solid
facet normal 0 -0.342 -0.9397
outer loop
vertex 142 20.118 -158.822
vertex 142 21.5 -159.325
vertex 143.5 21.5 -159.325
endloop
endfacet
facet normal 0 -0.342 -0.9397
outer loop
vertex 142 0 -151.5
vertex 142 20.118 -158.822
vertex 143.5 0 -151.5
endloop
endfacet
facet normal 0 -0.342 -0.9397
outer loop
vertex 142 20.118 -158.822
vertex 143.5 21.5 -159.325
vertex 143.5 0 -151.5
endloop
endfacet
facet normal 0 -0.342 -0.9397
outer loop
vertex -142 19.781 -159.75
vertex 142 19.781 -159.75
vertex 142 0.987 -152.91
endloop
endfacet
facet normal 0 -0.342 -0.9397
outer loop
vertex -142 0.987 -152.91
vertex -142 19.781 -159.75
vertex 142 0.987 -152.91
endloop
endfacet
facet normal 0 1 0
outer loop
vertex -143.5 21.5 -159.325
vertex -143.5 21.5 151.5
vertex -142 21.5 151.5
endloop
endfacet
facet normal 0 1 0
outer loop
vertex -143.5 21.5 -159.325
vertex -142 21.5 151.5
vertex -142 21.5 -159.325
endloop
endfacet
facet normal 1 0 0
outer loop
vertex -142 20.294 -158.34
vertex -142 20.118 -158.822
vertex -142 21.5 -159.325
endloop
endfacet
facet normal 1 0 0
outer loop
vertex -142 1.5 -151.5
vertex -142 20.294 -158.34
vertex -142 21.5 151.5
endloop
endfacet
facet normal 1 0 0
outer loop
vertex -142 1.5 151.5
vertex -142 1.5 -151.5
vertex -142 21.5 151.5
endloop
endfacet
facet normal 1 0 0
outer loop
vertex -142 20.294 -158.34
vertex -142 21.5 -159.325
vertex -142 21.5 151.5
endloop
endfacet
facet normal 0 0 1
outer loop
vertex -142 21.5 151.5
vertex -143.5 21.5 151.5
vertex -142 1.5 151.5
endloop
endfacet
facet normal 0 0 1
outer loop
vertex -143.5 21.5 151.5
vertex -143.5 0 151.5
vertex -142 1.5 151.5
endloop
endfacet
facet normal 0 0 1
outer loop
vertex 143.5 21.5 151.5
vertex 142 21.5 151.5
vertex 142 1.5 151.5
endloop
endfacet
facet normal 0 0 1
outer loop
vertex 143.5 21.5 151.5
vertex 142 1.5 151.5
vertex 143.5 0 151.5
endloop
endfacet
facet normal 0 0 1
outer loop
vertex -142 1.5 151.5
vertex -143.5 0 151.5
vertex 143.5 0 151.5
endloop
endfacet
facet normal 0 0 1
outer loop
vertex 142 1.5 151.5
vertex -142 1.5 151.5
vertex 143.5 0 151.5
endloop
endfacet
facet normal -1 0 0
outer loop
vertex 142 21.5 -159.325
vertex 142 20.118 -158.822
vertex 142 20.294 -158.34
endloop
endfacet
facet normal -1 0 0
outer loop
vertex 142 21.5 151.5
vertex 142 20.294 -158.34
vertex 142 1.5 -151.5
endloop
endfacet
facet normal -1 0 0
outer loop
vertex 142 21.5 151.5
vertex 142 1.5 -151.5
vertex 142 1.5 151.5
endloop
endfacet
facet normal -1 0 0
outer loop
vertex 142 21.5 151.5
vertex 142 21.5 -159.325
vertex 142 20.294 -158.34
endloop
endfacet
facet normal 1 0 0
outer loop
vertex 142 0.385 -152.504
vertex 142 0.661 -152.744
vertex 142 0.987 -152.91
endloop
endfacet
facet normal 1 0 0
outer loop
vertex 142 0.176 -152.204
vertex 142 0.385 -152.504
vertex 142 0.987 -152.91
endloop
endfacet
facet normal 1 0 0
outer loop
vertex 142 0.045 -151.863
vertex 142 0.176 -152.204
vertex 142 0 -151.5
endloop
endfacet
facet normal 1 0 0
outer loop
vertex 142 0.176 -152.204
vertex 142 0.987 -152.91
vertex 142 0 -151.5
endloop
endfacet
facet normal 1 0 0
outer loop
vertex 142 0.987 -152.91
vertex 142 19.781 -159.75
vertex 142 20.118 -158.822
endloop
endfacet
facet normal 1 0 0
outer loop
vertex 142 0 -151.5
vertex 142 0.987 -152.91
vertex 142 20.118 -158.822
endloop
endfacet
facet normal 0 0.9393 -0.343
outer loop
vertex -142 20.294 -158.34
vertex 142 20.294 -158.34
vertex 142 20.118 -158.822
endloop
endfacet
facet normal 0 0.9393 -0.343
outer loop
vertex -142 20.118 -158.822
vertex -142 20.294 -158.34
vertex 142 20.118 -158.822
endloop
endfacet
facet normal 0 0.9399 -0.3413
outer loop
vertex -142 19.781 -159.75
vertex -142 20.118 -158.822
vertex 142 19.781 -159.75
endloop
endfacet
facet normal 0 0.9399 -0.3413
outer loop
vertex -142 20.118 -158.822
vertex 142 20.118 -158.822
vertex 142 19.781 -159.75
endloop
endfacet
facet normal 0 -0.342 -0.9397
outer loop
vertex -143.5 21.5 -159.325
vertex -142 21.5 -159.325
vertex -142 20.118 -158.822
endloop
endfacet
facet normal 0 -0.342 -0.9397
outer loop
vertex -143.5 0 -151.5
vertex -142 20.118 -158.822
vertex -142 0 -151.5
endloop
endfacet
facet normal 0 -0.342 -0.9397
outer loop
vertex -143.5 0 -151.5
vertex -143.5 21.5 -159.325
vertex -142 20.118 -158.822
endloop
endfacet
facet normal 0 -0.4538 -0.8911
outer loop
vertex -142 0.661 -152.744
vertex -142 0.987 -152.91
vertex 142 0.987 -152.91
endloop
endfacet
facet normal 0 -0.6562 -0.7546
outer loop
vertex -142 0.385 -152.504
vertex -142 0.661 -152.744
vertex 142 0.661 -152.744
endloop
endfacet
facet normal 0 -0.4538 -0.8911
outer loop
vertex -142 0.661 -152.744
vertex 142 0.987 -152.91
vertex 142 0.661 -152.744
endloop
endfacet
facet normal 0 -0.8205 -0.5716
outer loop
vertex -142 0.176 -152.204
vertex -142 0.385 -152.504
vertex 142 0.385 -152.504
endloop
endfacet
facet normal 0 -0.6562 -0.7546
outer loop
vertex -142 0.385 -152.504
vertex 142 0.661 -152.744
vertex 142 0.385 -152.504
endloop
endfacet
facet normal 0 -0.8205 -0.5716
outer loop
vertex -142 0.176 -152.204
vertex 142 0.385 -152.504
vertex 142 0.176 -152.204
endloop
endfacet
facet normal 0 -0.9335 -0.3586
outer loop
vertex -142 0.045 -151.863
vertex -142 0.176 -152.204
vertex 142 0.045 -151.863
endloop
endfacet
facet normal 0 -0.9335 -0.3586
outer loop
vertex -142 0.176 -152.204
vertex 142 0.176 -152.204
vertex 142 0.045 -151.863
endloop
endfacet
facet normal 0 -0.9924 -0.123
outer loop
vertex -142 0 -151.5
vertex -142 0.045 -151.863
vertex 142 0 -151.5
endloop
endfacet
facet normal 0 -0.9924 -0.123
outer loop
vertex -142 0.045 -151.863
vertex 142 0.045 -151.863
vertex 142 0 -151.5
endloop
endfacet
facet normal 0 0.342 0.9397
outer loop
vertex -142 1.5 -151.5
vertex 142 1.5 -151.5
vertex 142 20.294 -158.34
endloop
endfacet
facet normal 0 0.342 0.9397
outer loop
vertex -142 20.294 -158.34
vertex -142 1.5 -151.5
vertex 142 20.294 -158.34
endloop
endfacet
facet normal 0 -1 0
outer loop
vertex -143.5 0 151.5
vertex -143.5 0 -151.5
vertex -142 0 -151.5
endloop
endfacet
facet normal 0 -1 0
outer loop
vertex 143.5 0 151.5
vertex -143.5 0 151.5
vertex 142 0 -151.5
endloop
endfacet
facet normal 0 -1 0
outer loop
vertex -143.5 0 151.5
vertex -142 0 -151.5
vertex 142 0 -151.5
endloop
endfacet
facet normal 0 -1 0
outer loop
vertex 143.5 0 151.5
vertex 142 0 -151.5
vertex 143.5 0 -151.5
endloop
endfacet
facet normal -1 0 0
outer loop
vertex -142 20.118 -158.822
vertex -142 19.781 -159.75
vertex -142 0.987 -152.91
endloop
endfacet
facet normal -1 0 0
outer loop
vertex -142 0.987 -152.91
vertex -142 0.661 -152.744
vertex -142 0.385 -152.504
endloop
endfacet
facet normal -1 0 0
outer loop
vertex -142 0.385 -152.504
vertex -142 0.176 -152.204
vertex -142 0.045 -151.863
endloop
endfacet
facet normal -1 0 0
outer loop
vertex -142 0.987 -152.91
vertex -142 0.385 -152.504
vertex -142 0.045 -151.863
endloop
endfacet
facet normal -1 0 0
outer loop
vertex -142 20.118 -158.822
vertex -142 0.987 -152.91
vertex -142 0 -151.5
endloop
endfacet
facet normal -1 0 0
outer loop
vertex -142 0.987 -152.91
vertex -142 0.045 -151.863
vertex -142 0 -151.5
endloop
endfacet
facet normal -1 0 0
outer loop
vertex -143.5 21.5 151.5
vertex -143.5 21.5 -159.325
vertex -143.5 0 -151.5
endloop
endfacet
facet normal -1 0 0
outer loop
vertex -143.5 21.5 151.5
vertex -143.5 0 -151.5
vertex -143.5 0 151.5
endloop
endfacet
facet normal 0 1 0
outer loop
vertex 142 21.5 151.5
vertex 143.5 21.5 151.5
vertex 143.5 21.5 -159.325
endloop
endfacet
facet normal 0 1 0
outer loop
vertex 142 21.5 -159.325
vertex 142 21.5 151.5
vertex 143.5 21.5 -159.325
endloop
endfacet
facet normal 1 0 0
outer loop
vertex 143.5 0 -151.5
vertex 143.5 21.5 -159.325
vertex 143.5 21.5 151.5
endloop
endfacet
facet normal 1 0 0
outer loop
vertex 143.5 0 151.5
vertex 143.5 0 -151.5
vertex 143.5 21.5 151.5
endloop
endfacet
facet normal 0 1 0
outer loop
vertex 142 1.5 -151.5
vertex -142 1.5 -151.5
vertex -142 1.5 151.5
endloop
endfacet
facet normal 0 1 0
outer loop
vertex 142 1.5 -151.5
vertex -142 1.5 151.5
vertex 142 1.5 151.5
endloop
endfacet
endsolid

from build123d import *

# Parameters (mm, degrees)
SKETCH1_W                        = 287
SKETCH1_H                        = 303
BOSS_EXTRUDE1_DEPTH              = 1.5
SKETCH8_W                        = 1.5
SKETCH8_H                        = 303
BOSS_EXTRUDE8_DEPTH              = 20
BOSS_EXTRUDE12_DEPTH             = 1.5
BOSS_EXTRUDE13_DEPTH             = 1.5
BOSS_EXTRUDE14_REACH             = 217.497
BOSS_EXTRUDE14_DIRECTION_2_REACH = 217.497


with BuildPart() as part:
    # Sketch1 → Boss-Extrude1 (new body)
    with BuildSketch(Plane(origin=(0, 0, 0), x_dir=(1, 0, 0), z_dir=(0, 1, 0))):
        Rectangle(SKETCH1_W, SKETCH1_H)
    extrude(amount=BOSS_EXTRUDE1_DEPTH)

    # Sketch8 → Boss-Extrude8 (add)
    with BuildSketch(Plane(origin=(0, 1.5, 0), x_dir=(1, 0, 0), z_dir=(0, 1, 0))):
        with Locations((-142.75, 0)):
            Rectangle(SKETCH8_W, SKETCH8_H)
        with Locations((142.75, 0)):
            Rectangle(SKETCH8_W, SKETCH8_H)
    extrude(amount=BOSS_EXTRUDE8_DEPTH)

    # Sketch12 → Boss-Extrude12 (add)
    with BuildSketch(Plane.ZY.offset(143.5)):
        Polygon((-151.5, 21.5), (-159.325360037, 21.5), (-151.5, 0), align=None)
    extrude(amount=-BOSS_EXTRUDE12_DEPTH)

    # Sketch13 → Boss-Extrude13 (add)
    with BuildSketch(Plane(origin=(143.5, 0, 0), x_dir=(0, 0, -1), z_dir=(1, 0, 0))):
        Polygon((151.5, 0), (151.5, 21.5), (159.325360037, 21.5), align=None)
    extrude(amount=-BOSS_EXTRUDE13_DEPTH)

    # Boss-Extrude14: up to this face of the body (flat: up to its plane)
    boss_extrude14_end = Plane(part.part.faces().sort_by_distance((142, 11.538792752, -2.109985057))[0])
    # Sketch15 → Boss-Extrude14 (add, up to the picked face)
    with BuildSketch(Plane(origin=(0, 0, 0), x_dir=(0, 0, -1), z_dir=(1, 0, 0)), mode=Mode.PRIVATE) as boss_extrude14_sk1:
        with BuildLine():
            Line((151.5, 1.5), (158.340402867, 20.293852416))
            Line((158.340402867, 20.293852416), (159.749941798, 19.780822201))
            Line((159.749941798, 19.780822201), (152.909538931, 0.986969785))
            ThreePointArc((152.909538931, 0.986969785), (152.360364655, 0.271271934), (151.5, 0))
            Line((151.5, 0), (151.5, 1.5))
        make_face()
    boss_extrude14_tool1 = split(extrude(boss_extrude14_sk1.sketch, amount=BOSS_EXTRUDE14_REACH, mode=Mode.PRIVATE), bisect_by=boss_extrude14_end, keep=Keep.BOTH, mode=Mode.PRIVATE)
    add(boss_extrude14_tool1.solids().sort_by(Axis((0, 10.206295, -155.467858), (1, 0, 0)))[0])

    # Boss-Extrude14 direction 2: up to this face of the body (flat: up to its plane)
    boss_extrude14_direction_2_end = Plane(part.part.faces().sort_by_distance((-142, 11.538792752, -2.109985057))[0])
    # Sketch15 → Boss-Extrude14 direction 2 (add, up to the picked face)
    with BuildSketch(Plane(origin=(0, 0, 0), x_dir=(0, 0, -1), z_dir=(1, 0, 0)), mode=Mode.PRIVATE) as boss_extrude14_direction_2_sk1:
        with BuildLine():
            Line((151.5, 1.5), (158.340402867, 20.293852416))
            Line((158.340402867, 20.293852416), (159.749941798, 19.780822201))
            Line((159.749941798, 19.780822201), (152.909538931, 0.986969785))
            ThreePointArc((152.909538931, 0.986969785), (152.360364655, 0.271271934), (151.5, 0))
            Line((151.5, 0), (151.5, 1.5))
        make_face()
    boss_extrude14_direction_2_tool1 = split(extrude(boss_extrude14_direction_2_sk1.sketch, amount=-BOSS_EXTRUDE14_DIRECTION_2_REACH, mode=Mode.PRIVATE), bisect_by=boss_extrude14_direction_2_end, keep=Keep.BOTH, mode=Mode.PRIVATE)
    add(boss_extrude14_direction_2_tool1.solids().sort_by(Axis((0, 10.206295, -155.467858), (-1, 0, 0)))[0])


solid = part.part
